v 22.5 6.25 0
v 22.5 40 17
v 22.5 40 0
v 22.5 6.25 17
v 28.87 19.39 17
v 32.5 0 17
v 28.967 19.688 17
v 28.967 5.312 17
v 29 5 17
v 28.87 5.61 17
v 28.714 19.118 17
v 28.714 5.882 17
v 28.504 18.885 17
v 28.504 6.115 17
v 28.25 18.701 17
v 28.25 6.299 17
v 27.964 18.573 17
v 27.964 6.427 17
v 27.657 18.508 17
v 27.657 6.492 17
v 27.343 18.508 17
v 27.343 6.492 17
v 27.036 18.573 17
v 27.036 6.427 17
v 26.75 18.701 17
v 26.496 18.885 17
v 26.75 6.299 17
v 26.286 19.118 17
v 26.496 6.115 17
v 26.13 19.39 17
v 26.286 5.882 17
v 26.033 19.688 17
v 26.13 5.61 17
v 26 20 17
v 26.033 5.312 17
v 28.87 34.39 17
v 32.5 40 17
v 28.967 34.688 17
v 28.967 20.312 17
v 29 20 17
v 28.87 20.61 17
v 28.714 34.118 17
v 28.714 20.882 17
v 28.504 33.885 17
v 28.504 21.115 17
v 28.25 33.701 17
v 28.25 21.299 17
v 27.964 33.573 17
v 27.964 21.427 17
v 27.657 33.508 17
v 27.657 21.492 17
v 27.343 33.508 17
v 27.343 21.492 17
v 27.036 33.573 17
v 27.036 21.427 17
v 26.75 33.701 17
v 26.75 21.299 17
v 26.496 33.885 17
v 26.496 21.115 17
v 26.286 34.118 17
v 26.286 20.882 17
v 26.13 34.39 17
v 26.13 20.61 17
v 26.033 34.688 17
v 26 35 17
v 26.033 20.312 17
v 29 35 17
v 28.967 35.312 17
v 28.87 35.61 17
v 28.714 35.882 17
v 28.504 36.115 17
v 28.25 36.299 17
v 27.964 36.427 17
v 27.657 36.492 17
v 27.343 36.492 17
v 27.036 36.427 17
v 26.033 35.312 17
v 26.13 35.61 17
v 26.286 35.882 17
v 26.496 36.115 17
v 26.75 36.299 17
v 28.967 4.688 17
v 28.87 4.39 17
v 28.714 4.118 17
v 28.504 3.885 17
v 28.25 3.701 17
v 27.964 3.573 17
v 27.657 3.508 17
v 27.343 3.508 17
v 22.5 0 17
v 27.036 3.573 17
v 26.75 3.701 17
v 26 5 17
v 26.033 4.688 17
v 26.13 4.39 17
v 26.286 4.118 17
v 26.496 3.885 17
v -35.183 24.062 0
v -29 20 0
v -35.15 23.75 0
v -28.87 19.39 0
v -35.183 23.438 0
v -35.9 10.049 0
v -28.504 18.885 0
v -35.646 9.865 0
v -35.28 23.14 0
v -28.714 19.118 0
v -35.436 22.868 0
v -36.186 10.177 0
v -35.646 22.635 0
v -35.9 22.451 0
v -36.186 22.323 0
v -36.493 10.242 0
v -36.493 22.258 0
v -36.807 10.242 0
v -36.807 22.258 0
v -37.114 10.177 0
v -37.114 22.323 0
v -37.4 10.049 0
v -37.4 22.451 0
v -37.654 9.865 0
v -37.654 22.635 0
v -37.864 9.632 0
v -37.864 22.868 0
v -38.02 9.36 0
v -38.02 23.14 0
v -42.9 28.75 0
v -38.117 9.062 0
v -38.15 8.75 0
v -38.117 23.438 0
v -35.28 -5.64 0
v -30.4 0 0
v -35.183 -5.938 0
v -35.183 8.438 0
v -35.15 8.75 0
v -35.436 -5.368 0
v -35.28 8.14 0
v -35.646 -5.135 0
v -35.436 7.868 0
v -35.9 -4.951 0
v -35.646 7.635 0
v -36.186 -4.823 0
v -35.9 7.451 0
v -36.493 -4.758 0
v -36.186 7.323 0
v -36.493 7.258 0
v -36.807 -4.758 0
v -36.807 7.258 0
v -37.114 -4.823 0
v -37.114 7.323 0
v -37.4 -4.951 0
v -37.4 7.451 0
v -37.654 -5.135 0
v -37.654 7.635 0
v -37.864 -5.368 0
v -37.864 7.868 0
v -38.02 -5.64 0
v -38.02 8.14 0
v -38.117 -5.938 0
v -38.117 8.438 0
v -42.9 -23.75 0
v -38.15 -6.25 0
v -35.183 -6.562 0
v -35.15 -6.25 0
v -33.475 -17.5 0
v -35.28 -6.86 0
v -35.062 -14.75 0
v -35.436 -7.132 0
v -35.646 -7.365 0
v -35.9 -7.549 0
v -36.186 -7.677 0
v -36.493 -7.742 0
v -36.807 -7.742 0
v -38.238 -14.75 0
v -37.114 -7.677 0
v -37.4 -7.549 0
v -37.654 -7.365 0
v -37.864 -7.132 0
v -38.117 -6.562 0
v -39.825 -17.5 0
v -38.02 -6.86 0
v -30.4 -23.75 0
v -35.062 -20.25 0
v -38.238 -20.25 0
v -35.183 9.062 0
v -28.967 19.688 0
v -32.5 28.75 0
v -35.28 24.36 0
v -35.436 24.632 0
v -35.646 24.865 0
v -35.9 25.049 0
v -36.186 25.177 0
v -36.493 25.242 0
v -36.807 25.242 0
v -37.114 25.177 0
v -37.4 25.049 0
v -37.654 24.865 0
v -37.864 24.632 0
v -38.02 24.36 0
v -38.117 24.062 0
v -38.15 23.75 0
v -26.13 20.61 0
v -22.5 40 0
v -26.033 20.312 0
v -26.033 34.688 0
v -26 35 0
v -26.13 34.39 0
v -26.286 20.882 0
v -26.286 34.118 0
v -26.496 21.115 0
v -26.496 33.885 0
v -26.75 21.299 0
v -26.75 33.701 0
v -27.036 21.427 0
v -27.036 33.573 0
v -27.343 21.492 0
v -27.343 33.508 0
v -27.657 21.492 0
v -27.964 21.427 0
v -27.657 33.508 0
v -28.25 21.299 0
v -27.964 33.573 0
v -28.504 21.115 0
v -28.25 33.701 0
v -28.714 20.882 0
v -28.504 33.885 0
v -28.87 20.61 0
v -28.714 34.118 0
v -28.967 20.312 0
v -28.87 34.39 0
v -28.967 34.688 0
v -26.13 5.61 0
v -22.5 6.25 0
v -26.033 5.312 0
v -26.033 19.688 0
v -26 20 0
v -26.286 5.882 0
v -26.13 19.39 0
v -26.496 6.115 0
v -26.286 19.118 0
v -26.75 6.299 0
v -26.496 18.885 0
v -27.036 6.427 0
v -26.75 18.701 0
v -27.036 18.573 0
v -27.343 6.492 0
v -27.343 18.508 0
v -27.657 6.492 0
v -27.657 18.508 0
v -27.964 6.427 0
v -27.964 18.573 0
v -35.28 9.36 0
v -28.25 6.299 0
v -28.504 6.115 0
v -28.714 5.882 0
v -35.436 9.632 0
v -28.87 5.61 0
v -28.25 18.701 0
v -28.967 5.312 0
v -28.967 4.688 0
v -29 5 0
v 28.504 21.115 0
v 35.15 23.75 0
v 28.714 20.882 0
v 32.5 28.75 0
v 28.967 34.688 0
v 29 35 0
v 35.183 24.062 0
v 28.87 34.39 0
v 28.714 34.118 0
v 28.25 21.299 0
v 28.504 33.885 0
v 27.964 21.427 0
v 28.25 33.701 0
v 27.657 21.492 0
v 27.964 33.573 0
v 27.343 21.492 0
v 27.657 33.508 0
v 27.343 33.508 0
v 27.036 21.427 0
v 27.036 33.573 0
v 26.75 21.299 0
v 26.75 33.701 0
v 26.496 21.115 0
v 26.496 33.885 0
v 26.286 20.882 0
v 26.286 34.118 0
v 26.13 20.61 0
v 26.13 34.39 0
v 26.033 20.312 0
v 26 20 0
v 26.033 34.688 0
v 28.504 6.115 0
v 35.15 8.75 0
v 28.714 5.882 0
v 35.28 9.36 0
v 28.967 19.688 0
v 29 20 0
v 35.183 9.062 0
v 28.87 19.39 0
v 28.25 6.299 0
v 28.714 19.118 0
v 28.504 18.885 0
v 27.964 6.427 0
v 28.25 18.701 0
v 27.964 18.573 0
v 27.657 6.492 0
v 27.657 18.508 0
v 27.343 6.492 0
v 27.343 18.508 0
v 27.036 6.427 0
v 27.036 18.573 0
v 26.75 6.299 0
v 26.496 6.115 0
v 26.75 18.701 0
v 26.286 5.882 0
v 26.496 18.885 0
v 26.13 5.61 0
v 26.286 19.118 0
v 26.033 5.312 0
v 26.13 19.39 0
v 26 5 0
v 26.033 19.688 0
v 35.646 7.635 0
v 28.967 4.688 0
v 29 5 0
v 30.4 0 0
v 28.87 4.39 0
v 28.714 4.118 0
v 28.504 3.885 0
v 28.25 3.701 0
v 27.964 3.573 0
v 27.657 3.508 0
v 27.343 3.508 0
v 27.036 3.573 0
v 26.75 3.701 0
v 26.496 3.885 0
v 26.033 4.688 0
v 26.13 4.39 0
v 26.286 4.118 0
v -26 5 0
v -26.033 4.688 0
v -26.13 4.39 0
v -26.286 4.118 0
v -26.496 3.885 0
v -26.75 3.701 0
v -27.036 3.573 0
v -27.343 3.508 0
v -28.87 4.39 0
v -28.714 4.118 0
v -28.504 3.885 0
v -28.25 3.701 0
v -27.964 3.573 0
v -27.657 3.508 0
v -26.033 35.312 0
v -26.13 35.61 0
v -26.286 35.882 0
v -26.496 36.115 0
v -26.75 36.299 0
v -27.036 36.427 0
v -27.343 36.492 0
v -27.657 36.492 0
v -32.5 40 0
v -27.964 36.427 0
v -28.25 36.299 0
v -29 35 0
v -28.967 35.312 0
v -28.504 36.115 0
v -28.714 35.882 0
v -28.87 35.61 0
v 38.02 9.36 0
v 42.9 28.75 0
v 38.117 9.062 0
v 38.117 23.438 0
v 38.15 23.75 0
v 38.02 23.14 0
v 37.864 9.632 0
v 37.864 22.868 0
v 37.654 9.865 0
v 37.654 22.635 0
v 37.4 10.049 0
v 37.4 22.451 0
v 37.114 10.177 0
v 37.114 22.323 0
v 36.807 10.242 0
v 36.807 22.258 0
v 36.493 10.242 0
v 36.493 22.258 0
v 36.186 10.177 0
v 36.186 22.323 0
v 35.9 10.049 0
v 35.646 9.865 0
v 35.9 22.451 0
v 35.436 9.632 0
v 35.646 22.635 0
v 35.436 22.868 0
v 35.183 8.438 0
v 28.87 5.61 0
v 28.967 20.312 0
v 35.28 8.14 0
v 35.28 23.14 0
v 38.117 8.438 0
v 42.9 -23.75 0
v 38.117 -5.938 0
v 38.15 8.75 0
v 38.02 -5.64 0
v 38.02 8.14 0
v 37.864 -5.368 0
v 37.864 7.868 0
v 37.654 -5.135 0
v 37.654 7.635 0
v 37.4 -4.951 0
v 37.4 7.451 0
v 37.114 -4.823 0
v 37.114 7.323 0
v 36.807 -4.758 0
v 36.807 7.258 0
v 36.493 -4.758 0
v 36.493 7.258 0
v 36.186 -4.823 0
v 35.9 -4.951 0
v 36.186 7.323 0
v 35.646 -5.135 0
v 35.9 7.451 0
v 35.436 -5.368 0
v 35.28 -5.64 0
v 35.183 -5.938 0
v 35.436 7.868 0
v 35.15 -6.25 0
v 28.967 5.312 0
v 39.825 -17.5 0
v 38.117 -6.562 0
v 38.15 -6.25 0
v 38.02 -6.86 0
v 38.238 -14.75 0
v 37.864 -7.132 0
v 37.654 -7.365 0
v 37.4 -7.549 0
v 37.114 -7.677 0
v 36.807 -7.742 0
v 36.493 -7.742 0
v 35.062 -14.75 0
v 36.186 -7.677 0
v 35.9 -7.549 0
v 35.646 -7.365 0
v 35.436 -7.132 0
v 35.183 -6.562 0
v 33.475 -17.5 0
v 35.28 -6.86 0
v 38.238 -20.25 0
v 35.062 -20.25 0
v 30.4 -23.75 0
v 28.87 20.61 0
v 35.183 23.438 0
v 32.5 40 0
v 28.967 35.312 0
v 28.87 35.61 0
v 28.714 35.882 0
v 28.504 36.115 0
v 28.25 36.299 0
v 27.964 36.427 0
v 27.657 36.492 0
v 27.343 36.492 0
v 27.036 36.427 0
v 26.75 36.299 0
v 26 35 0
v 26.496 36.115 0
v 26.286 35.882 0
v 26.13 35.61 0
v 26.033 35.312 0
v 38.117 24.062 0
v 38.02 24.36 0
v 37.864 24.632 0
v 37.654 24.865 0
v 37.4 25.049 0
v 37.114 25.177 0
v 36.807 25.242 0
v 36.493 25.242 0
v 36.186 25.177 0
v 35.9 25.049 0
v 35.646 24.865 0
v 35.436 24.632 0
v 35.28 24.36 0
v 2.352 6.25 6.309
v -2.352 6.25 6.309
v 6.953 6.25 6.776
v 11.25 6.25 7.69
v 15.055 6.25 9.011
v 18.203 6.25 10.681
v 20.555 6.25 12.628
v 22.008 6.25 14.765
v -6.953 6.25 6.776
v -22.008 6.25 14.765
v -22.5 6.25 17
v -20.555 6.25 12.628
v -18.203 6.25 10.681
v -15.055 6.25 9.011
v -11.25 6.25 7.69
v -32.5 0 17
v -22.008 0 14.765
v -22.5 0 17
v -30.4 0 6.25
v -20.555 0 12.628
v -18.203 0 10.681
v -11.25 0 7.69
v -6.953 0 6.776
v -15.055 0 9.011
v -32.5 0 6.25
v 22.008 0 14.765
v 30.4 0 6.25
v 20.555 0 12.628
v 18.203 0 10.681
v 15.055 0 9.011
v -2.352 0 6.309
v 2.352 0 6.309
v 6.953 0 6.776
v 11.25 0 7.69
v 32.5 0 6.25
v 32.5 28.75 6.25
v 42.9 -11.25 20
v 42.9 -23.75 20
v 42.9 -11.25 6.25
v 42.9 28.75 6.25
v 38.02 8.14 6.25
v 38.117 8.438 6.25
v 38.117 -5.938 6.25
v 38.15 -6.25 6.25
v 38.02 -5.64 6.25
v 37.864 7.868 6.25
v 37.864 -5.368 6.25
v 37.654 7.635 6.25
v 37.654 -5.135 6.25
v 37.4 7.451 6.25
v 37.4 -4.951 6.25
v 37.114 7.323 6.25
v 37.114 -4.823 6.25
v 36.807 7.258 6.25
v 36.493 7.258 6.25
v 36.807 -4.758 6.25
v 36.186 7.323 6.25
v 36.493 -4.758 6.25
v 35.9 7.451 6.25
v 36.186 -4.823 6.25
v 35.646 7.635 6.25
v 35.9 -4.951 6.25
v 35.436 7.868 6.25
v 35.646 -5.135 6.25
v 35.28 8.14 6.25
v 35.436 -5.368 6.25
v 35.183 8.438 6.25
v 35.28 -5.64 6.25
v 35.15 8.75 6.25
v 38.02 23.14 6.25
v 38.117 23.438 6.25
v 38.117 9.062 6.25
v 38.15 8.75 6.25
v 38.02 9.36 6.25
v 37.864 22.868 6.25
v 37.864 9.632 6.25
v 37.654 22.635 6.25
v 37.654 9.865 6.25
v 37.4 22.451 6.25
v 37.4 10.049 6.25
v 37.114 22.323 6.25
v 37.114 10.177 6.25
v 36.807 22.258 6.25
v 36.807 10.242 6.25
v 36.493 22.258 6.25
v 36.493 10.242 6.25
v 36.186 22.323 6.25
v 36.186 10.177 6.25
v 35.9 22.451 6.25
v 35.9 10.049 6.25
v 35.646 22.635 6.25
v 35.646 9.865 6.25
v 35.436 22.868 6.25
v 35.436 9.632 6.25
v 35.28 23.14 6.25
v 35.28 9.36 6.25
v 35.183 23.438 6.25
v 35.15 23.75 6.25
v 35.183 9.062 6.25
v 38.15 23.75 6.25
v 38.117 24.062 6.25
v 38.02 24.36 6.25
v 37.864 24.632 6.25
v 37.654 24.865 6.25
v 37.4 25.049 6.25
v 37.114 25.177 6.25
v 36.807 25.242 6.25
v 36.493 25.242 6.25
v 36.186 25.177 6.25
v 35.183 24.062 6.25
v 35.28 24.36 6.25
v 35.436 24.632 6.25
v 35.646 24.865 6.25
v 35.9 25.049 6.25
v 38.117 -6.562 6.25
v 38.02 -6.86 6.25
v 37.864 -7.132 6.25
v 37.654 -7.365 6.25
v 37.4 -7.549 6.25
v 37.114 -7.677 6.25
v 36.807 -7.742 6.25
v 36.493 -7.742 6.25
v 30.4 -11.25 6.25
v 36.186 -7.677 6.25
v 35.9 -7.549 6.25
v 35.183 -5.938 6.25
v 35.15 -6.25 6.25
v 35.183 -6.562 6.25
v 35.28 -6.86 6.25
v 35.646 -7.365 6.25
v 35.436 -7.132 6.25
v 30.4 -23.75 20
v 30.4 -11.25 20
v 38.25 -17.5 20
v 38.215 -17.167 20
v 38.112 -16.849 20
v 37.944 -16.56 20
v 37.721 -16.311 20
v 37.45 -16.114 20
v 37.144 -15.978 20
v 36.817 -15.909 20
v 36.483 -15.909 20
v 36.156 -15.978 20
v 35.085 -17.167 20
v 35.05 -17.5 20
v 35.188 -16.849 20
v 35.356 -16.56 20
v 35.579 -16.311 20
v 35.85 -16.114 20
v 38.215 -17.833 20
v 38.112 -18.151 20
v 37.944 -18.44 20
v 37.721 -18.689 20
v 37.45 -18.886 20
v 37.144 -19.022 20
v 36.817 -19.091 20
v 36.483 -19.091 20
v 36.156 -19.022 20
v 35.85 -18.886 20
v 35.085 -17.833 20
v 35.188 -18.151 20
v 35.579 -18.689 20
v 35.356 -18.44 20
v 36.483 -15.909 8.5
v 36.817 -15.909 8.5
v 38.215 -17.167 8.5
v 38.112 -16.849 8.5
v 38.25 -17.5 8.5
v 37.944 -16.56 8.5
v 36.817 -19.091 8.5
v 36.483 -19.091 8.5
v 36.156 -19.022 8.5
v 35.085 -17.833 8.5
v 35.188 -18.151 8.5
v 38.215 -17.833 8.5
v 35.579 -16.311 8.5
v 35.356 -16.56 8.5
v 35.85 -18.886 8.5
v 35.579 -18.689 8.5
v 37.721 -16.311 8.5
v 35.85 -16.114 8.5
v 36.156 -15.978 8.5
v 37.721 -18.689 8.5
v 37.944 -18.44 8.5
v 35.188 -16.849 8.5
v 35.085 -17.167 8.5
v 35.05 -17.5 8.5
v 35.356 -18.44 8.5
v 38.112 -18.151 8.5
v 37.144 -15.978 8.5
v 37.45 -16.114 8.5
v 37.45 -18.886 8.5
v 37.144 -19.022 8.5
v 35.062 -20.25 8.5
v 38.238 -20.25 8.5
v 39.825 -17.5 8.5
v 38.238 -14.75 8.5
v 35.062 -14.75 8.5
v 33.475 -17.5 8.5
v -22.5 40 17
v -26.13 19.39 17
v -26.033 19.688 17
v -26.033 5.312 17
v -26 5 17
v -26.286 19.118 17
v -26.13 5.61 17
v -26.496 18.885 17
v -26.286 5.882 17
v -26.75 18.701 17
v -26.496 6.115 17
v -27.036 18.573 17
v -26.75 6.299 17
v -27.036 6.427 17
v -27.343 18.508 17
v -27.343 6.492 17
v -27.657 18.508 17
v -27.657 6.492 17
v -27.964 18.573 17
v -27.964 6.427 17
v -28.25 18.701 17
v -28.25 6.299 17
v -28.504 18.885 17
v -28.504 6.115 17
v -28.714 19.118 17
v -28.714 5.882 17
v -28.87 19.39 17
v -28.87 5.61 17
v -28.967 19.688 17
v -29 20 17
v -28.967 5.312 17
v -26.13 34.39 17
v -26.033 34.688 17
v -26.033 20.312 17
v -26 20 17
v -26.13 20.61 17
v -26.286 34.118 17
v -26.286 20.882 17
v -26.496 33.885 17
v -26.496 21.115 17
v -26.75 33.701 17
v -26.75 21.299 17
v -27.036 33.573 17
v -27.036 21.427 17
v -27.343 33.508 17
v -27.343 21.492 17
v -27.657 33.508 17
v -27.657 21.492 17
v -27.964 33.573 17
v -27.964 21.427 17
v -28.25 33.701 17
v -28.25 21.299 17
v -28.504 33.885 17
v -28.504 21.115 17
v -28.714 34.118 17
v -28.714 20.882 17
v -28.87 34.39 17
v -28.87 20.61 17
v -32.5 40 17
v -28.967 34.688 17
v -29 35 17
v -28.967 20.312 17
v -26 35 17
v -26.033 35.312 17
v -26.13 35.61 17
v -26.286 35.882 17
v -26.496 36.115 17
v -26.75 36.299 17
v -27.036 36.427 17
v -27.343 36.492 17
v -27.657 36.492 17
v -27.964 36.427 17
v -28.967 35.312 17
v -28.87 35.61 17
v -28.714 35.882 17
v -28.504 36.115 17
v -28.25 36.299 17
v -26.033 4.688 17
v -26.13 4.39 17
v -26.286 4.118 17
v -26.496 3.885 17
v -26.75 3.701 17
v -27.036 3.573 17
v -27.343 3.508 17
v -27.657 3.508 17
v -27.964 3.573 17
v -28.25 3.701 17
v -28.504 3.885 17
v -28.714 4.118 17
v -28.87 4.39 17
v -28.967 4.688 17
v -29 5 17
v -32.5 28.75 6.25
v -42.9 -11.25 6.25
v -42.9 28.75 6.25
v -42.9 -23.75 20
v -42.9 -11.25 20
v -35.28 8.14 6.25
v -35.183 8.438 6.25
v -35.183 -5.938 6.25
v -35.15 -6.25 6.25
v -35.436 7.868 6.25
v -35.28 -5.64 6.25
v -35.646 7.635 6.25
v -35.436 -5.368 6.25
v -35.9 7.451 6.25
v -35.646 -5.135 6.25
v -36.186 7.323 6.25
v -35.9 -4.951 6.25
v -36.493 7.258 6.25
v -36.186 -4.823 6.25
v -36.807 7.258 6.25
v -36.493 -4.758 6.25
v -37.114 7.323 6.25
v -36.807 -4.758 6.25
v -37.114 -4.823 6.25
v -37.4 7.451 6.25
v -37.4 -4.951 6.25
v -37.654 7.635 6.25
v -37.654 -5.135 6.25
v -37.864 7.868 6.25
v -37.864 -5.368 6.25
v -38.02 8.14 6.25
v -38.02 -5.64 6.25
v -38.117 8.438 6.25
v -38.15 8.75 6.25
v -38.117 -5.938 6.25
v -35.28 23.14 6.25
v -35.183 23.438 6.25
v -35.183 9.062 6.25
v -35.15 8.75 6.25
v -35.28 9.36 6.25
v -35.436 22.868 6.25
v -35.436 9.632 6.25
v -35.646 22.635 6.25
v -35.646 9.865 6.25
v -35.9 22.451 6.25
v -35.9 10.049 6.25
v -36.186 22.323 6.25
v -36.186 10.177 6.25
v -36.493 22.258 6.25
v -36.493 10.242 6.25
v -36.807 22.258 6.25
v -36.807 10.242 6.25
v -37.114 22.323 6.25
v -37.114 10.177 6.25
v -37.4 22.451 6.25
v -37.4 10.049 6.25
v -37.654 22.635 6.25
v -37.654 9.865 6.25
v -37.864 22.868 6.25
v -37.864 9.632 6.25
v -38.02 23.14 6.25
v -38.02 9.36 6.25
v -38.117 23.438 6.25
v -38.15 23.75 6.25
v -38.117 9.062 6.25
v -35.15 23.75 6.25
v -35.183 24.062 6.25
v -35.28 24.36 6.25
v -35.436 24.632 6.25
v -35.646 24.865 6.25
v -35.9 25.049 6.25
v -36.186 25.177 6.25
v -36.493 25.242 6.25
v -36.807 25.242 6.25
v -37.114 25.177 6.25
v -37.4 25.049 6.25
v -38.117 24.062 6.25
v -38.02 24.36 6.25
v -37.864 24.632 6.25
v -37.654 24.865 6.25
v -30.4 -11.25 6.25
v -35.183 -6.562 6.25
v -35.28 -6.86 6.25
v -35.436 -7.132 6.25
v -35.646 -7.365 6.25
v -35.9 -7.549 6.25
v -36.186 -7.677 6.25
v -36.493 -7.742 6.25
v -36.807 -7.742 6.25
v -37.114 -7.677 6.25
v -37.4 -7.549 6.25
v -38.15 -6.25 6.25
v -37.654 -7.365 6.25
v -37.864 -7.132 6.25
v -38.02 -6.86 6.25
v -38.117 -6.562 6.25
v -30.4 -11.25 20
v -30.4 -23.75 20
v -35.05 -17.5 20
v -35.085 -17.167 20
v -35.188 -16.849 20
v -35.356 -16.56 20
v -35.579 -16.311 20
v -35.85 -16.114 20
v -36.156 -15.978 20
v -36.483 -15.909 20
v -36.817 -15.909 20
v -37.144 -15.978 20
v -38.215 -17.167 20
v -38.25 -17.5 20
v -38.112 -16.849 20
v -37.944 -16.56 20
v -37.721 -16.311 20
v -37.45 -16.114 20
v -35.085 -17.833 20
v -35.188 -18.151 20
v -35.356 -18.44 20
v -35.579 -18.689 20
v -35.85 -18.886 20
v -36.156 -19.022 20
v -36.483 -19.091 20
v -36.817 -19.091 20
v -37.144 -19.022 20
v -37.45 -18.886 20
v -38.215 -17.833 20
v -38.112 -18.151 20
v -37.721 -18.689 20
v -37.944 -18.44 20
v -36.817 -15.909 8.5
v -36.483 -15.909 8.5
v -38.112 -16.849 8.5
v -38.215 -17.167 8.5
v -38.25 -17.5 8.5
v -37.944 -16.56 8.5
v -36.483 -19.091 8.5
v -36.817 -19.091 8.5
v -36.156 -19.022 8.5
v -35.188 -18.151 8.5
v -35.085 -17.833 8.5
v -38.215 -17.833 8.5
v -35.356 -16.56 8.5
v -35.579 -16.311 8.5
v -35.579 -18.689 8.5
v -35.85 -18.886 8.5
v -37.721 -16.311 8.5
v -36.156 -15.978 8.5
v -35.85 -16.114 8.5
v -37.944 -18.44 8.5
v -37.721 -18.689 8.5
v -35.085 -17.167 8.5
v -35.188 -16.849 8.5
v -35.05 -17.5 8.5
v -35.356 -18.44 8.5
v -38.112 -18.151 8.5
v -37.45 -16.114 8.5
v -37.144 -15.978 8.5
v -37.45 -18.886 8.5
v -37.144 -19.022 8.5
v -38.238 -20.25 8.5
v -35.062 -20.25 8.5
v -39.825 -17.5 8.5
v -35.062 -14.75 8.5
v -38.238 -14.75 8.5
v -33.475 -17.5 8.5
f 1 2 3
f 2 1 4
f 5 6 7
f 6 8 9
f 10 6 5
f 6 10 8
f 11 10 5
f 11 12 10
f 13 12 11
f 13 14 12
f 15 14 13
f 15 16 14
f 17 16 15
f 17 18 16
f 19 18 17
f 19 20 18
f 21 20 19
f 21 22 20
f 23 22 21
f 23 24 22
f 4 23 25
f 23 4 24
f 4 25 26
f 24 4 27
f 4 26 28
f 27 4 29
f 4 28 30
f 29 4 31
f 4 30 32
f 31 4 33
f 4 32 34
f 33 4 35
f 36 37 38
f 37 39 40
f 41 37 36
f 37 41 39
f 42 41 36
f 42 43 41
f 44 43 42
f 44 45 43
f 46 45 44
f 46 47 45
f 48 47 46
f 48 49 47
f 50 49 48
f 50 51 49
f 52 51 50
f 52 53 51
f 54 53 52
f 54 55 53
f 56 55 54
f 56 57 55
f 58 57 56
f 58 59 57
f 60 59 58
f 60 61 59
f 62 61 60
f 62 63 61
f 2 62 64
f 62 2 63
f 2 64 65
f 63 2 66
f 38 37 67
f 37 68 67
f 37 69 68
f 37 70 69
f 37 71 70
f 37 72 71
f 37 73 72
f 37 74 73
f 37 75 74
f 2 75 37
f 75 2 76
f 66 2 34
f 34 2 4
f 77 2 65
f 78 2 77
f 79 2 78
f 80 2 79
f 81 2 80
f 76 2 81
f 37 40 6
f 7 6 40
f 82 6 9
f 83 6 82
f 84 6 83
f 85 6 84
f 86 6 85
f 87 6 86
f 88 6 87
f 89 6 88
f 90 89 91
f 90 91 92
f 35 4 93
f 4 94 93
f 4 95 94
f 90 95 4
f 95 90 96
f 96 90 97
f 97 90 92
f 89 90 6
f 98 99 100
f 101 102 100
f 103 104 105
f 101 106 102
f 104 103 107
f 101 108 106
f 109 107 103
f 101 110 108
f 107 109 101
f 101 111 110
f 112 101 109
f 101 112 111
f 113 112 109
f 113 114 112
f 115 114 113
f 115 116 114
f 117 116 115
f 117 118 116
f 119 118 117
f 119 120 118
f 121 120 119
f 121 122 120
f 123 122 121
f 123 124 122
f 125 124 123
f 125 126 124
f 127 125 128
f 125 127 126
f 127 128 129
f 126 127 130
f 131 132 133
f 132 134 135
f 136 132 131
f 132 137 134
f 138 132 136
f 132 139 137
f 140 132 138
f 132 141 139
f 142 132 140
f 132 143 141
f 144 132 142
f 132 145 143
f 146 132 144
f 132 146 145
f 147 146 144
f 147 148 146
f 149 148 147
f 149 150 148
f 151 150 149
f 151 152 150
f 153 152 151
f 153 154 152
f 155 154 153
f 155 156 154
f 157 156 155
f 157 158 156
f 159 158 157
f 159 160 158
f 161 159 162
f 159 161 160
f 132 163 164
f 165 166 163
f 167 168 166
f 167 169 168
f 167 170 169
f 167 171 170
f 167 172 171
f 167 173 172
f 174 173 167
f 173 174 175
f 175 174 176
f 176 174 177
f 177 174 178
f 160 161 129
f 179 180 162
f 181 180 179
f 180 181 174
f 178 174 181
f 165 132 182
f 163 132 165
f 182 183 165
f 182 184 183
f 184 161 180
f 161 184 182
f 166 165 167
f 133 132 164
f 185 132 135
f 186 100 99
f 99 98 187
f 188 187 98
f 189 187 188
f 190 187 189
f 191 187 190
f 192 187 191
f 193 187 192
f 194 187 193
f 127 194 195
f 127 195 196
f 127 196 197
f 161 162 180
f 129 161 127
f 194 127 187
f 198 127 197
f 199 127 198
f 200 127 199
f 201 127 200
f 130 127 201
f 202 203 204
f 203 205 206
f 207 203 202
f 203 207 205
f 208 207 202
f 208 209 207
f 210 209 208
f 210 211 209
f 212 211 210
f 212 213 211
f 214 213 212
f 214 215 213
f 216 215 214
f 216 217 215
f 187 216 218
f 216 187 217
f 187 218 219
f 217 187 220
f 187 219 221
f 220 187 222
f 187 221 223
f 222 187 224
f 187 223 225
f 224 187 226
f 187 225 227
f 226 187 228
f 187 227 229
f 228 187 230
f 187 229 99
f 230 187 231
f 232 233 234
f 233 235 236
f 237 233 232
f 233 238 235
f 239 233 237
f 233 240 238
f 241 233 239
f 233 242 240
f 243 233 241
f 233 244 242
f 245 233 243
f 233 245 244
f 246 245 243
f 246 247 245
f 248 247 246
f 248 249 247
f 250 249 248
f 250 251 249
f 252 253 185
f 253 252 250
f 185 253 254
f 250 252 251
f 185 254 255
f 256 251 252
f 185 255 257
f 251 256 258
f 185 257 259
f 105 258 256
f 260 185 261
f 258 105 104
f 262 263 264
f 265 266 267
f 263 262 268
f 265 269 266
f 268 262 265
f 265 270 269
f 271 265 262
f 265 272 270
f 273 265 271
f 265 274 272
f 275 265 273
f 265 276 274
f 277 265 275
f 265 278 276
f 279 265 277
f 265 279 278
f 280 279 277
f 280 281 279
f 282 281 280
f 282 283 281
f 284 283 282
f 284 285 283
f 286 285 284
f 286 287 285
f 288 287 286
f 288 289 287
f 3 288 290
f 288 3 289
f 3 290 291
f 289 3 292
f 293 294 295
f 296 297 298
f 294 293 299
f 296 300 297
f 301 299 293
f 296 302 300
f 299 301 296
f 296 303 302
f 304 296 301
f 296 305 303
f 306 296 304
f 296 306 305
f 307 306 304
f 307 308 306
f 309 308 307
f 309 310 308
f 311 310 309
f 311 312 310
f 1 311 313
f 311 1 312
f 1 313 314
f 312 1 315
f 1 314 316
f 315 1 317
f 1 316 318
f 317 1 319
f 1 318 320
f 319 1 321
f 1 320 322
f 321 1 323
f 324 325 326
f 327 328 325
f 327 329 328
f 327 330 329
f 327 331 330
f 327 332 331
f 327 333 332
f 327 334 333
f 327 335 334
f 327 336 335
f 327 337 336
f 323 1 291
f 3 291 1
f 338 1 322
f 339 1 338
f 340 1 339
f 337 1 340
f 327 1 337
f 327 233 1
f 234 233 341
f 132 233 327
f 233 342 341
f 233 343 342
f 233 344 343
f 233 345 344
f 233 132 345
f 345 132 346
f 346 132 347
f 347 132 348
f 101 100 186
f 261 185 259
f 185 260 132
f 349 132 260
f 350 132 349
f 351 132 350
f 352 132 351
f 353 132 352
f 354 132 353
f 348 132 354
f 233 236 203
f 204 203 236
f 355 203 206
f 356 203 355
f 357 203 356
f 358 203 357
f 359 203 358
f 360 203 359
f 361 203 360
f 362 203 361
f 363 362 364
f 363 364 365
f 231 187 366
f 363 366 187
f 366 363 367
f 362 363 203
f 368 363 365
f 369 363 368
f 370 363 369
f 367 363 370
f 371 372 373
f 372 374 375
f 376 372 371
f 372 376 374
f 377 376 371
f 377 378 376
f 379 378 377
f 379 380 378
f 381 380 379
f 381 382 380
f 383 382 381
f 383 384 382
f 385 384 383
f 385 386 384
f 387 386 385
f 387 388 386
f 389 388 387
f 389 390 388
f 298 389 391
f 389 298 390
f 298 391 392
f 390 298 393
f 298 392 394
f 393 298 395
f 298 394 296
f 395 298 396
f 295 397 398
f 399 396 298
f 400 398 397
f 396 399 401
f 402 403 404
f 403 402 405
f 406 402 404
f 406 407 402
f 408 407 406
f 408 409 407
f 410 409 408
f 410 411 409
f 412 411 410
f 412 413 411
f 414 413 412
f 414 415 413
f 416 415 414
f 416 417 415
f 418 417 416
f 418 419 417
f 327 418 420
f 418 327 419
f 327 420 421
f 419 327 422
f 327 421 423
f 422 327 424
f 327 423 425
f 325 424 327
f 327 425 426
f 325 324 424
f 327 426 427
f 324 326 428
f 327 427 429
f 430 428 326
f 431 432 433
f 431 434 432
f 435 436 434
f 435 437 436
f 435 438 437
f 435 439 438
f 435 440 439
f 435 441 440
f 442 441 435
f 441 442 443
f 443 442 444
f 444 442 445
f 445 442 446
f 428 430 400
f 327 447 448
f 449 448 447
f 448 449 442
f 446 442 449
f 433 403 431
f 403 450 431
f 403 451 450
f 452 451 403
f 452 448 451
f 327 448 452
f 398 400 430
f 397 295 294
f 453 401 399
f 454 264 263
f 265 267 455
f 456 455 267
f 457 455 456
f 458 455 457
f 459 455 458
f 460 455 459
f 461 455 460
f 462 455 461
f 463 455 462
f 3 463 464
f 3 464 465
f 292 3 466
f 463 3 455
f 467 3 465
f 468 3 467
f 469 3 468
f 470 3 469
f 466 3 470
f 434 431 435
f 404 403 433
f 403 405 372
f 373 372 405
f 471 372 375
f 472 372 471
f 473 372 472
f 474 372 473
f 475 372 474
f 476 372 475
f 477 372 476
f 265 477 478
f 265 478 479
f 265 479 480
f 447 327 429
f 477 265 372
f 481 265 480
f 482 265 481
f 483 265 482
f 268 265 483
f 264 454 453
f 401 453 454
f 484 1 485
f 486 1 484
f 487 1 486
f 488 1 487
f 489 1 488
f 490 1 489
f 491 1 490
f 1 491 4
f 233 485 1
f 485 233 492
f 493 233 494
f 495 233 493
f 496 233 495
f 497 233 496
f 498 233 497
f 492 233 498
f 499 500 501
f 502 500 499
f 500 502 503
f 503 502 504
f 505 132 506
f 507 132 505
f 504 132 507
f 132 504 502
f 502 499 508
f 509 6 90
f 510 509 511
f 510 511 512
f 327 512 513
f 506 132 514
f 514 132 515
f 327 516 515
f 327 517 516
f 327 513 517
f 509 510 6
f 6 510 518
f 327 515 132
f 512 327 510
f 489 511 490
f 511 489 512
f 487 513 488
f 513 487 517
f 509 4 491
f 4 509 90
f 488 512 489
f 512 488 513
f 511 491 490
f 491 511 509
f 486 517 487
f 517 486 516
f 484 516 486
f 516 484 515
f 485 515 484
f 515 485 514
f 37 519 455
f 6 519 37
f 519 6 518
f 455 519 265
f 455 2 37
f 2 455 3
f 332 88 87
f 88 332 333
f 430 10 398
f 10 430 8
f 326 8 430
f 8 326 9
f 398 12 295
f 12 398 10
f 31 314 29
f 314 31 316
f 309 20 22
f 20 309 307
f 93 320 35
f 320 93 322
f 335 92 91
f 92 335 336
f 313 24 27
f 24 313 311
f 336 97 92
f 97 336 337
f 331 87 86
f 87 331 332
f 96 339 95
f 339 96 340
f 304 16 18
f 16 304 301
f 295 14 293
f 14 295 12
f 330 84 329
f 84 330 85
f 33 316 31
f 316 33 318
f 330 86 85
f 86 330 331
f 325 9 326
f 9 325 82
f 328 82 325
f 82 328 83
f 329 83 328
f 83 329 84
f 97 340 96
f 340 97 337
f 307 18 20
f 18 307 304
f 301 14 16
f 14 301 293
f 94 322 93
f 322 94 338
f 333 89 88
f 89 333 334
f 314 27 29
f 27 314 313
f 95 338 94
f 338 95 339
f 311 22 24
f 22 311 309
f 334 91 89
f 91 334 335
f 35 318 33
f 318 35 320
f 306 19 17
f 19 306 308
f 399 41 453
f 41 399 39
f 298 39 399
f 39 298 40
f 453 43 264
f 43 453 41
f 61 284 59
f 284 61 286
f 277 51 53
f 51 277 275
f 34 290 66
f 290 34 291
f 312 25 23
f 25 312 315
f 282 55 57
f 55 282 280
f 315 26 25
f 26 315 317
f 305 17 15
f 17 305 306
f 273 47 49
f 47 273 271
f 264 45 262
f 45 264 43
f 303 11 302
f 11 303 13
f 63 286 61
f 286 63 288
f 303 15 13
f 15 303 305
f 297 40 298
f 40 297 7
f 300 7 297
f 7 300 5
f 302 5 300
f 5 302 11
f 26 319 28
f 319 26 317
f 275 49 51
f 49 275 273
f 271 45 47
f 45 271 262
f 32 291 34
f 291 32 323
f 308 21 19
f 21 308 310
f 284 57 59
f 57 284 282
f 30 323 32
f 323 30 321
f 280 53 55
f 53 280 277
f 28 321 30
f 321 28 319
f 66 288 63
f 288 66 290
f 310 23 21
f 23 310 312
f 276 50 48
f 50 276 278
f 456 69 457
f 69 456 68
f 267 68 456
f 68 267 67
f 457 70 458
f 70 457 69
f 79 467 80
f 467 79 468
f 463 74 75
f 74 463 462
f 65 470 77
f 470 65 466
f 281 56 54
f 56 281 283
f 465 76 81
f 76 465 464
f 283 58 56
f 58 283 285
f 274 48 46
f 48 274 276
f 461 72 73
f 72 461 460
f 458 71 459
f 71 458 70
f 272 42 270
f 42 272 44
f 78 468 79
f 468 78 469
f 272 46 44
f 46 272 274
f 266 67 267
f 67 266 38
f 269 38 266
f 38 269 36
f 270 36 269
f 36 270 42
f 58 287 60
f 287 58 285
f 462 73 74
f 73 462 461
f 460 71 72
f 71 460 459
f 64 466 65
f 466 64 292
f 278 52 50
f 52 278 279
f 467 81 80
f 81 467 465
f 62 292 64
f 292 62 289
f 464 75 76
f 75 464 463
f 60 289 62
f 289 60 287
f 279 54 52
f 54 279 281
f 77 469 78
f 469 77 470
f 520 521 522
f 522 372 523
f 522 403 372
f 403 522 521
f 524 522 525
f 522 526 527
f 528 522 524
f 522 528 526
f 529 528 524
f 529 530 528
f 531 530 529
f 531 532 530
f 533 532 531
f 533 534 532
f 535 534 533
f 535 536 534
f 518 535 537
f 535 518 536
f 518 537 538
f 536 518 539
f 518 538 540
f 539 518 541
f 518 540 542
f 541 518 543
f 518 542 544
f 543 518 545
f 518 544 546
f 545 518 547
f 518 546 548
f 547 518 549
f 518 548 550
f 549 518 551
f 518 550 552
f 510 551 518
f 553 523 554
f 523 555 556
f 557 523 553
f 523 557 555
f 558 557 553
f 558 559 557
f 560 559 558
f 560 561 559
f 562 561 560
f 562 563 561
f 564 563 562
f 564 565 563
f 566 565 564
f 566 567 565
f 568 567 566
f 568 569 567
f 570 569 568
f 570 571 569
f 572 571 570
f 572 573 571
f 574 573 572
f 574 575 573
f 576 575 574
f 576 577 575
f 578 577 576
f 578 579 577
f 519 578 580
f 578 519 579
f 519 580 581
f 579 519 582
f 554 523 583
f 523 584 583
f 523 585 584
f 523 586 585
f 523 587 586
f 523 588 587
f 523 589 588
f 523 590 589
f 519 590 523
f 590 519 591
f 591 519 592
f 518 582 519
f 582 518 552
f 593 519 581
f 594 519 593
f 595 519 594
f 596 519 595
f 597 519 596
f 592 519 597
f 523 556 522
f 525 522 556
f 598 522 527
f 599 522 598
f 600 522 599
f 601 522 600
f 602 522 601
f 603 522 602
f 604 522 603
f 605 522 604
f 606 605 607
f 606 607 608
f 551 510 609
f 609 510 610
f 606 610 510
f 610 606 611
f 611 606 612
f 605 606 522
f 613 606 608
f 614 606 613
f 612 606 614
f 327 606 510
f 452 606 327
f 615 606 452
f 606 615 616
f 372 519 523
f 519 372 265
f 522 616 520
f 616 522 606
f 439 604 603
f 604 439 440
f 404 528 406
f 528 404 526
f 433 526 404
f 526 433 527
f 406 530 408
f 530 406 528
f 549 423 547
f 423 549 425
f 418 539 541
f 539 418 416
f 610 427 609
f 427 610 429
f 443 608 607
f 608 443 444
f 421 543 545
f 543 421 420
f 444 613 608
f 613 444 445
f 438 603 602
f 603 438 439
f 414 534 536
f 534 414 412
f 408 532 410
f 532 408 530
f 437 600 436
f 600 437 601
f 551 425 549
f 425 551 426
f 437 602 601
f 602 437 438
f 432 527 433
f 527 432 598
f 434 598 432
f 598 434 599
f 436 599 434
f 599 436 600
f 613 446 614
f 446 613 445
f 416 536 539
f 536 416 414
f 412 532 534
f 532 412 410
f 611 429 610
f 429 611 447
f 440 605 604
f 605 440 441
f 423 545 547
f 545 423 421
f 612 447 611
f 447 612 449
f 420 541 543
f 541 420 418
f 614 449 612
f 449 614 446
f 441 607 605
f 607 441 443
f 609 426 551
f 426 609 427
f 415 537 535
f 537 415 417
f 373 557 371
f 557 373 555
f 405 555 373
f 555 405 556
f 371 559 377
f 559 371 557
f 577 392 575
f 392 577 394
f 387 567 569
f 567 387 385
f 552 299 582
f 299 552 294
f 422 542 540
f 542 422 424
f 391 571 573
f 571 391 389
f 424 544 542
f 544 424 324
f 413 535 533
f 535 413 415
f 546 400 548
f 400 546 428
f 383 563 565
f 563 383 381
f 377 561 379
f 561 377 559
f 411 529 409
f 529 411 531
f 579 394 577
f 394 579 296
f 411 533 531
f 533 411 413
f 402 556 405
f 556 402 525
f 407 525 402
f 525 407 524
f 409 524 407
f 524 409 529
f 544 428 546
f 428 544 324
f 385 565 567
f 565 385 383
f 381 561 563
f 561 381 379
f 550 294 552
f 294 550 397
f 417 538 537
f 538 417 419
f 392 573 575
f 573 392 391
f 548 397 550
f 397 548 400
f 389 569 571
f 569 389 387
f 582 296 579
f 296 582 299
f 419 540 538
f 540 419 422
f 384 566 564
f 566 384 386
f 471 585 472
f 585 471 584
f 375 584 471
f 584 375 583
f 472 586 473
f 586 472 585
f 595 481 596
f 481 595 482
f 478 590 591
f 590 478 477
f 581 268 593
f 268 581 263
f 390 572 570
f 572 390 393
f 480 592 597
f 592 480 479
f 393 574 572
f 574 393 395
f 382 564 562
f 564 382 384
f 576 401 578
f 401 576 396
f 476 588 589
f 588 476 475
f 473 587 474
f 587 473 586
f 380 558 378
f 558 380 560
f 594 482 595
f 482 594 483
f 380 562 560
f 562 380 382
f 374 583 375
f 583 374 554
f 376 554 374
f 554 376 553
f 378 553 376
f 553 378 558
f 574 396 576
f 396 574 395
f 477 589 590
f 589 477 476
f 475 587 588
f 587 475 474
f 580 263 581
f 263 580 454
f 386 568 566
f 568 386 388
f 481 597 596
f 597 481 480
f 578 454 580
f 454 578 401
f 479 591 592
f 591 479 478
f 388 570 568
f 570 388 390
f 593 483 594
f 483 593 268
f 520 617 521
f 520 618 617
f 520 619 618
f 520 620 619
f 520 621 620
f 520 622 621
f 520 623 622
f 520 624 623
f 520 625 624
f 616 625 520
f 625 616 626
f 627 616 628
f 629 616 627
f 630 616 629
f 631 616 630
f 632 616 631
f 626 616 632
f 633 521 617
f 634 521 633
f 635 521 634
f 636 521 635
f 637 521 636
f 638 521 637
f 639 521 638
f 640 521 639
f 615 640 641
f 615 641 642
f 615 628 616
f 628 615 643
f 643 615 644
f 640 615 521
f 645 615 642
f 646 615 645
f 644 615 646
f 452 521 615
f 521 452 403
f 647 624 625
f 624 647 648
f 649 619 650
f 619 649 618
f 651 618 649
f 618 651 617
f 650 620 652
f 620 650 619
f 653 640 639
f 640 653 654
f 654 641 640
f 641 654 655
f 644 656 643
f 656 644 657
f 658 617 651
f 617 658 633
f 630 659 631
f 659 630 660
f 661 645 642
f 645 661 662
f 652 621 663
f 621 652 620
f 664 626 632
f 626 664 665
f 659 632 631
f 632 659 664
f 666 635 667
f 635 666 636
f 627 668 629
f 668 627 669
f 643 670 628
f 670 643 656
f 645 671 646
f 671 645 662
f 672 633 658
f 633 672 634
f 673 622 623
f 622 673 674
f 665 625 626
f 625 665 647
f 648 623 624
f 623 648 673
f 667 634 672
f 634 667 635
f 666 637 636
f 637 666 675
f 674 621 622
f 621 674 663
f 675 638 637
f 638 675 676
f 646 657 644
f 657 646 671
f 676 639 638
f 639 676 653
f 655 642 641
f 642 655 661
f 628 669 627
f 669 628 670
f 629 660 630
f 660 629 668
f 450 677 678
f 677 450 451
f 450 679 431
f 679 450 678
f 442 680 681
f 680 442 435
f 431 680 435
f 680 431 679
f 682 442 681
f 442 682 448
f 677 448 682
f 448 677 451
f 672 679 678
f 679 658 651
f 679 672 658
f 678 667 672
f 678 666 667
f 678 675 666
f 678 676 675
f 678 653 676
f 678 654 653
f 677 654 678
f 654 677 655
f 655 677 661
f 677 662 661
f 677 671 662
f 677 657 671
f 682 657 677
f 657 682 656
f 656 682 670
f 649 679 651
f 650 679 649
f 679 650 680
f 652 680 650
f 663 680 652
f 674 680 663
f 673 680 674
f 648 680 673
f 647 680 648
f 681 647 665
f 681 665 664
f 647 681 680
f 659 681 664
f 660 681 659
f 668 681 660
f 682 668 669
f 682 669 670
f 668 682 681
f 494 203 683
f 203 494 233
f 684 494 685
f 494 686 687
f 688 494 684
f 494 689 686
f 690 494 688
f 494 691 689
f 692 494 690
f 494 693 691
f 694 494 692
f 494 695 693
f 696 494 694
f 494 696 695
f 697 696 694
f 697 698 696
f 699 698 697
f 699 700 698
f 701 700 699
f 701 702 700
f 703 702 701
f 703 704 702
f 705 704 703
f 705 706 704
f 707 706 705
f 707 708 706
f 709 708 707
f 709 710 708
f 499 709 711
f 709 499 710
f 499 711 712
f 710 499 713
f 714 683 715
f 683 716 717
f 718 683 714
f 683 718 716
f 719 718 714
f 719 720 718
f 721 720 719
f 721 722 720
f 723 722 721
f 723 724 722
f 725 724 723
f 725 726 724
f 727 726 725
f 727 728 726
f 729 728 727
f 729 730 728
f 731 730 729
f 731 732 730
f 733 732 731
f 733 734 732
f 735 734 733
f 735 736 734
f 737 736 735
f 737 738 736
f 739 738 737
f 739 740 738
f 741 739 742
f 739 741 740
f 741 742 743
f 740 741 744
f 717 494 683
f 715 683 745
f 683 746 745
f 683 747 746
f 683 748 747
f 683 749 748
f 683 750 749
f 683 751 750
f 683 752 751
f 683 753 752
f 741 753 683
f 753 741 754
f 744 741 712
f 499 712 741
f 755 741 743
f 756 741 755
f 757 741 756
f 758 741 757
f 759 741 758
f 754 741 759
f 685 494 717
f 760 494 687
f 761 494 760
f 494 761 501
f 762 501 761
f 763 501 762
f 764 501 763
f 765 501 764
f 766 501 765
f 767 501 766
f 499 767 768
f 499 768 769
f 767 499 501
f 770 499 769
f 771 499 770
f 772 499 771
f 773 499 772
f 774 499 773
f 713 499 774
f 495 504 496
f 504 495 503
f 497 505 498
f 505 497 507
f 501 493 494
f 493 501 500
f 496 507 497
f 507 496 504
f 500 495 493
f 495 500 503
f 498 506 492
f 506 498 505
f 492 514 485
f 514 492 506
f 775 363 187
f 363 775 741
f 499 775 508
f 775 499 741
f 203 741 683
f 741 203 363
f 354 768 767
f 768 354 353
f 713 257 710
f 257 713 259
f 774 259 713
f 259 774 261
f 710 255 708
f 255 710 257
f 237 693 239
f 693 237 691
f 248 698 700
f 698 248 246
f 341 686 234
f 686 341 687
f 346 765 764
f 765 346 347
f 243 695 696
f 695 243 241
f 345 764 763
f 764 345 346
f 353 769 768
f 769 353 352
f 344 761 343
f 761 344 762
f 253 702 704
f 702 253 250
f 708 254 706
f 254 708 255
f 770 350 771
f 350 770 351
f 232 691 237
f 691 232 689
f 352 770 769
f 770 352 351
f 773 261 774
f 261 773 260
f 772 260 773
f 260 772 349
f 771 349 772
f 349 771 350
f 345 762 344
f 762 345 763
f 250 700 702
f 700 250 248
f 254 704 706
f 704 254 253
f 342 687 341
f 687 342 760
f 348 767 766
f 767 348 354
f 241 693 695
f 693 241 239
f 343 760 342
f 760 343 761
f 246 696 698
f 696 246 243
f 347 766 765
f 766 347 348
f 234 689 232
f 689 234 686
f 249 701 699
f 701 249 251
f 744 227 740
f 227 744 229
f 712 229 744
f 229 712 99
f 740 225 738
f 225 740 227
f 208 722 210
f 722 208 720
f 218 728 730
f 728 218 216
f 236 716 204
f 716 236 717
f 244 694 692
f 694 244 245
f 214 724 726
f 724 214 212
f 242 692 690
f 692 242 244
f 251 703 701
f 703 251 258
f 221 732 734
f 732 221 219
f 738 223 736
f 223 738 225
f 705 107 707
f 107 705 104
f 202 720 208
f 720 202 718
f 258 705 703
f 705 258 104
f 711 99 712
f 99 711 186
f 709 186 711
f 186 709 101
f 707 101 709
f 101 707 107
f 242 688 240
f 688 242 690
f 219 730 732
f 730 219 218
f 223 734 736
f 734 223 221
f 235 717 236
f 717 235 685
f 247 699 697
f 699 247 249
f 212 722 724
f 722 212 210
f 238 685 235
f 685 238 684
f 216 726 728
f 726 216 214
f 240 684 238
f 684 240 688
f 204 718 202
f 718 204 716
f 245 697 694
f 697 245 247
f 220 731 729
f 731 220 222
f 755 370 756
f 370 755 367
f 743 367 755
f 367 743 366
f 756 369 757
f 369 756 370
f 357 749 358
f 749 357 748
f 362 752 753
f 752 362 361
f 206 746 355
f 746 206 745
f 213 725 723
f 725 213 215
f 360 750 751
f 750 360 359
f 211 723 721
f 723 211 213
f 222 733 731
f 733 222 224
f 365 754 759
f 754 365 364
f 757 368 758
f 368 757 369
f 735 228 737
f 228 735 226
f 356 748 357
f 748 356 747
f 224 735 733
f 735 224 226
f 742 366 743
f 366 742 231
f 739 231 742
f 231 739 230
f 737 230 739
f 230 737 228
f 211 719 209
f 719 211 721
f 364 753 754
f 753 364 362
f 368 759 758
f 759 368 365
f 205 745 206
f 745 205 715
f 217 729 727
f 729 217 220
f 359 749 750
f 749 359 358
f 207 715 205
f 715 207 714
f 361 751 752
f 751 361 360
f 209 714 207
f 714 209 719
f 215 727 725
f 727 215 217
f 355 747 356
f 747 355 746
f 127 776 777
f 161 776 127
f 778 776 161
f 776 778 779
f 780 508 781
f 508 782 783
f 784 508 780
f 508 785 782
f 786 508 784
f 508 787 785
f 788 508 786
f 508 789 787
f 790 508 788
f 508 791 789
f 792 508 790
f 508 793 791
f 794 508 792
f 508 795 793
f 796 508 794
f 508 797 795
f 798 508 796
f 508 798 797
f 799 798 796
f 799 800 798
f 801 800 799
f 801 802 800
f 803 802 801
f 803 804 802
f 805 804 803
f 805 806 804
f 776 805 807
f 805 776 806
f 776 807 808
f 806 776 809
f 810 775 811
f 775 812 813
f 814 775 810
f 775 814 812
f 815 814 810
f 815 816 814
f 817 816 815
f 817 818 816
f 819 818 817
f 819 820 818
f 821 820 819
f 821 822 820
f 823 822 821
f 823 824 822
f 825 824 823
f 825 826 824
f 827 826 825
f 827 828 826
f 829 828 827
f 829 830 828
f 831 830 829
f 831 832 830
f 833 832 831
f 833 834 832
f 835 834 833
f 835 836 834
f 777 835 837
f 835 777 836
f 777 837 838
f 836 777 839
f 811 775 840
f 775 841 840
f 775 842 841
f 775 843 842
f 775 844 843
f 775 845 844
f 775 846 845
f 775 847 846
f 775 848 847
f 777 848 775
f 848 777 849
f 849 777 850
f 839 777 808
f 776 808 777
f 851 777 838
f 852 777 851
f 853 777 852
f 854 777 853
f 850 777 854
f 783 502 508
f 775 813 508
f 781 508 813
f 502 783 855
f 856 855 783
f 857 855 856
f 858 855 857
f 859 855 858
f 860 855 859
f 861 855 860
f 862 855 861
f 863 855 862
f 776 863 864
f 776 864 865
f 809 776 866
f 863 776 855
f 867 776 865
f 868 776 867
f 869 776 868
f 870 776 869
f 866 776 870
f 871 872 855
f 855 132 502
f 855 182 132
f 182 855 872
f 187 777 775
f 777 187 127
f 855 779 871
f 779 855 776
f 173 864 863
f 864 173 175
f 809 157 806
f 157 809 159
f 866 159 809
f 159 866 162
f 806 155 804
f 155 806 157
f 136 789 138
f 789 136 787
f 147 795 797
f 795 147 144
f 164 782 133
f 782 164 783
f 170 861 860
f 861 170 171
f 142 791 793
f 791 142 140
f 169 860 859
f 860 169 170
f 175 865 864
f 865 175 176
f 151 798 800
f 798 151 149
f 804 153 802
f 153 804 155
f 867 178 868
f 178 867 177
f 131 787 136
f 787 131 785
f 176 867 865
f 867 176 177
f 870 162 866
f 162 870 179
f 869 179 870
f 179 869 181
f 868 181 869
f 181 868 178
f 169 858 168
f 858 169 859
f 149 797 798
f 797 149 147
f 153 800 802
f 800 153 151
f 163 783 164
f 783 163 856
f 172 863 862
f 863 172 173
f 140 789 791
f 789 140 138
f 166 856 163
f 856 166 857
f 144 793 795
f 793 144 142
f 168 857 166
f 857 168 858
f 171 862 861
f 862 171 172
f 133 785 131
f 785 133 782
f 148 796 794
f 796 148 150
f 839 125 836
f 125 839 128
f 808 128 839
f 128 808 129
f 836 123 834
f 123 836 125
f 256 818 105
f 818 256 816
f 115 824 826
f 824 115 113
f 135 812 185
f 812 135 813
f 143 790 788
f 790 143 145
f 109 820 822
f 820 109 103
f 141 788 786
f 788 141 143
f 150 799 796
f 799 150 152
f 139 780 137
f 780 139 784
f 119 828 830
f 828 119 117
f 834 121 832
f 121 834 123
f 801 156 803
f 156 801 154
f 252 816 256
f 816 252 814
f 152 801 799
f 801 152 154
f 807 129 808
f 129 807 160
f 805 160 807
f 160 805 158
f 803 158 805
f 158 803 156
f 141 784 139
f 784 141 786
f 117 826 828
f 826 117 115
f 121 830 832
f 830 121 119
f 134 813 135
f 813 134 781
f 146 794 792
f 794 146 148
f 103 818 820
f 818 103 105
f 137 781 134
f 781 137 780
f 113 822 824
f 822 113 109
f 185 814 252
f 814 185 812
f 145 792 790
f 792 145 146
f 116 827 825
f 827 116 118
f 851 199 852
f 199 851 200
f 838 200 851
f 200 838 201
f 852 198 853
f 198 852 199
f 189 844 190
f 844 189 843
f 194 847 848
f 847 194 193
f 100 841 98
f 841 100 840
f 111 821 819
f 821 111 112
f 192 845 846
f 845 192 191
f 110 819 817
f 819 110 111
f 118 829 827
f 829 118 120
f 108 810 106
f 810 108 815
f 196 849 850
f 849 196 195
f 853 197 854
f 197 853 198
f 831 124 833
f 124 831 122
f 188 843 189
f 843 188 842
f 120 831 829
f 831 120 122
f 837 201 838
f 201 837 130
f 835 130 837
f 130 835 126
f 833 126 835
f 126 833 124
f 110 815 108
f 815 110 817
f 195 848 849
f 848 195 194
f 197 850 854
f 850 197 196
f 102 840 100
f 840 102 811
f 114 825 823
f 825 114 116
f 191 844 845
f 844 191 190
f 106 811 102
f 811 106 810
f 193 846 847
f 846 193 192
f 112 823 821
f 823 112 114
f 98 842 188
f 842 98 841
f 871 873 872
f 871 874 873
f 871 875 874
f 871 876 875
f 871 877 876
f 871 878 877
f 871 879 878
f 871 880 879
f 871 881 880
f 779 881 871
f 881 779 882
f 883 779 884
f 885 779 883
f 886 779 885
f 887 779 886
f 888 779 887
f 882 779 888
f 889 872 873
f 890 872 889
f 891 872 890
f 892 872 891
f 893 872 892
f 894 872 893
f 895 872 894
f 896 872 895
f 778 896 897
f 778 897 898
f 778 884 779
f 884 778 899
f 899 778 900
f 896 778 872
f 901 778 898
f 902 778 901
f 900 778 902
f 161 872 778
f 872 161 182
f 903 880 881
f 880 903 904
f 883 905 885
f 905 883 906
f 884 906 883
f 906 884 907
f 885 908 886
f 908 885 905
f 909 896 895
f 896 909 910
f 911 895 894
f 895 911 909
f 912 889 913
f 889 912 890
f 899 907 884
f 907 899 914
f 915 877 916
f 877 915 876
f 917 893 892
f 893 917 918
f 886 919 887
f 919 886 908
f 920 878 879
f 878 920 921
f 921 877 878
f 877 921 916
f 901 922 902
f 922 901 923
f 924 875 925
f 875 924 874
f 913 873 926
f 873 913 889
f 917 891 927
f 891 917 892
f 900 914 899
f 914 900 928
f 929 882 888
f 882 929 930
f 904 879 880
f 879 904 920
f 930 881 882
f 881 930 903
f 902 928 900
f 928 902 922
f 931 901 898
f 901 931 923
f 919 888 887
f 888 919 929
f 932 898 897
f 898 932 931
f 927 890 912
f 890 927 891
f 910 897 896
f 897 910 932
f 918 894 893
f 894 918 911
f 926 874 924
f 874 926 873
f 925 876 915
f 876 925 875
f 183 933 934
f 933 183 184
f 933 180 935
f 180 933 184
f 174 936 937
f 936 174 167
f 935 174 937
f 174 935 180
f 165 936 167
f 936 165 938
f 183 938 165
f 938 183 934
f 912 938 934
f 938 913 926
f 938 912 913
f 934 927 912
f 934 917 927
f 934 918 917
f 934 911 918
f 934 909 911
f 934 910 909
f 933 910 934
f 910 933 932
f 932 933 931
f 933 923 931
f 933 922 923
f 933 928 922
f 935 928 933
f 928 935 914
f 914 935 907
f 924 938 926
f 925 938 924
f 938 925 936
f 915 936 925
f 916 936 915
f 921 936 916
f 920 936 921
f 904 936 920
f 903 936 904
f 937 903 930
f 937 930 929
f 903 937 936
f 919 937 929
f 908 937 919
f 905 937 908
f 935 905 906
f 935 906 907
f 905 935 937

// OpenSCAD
//OpenSCAD version 2021.01
//Bracket for mounting a single BMG extruder to Makerbot Dual Extruder carriage
//Simon Pilepich 2021-09-16

//Works nema bracket that comes with BMG kit

h=17; //Height to raise the bracket by
mount_hole_spacing=73.3;
mount_hole_diameter=3;
mount_hole_nut=5.5;
w=12.5; // width of attachment square
carriage_width = 130; // Overall carrier width
mount_hole_nut_radius=mount_hole_nut/2/sin(30)/sin(60); //Calculate diameter for nut
y_offset = 21.5-4; // Back spacing




one_side();
mirror([1,0,0]) one_side();

module one_side() {
    //NEMA bracket riser
    nbr=[carriage_width/2,40,h];
    difference() {
        //NEMA base block
        cube([nbr[0]/2,nbr[1],nbr[2]]);
        translate([0,w/2,0]) {
            //space saving hole
            cube([nbr[0]/2-10,nbr[1],nbr[2]]);
            //arch
            scale([((nbr[0]/2)-10)/(h-w/2),1,1]) translate([0,0,h]) rotate([90,0,0]) cylinder(r=h-w/2,h=w/2);
        }
        //NEMA bracker mount screw 
        translate([nbr[0]/2-5,5,0]) cylinder(d=3,h=h,$fn=30);
        translate([nbr[0]/2-5,nbr[1]/2,0]) cylinder(d=3,h=h,$fn=30);
        translate([nbr[0]/2-5,nbr[1]-5,0]) cylinder(d=3,h=h,$fn=30);

    }
    //Connecting brace
    translate([mount_hole_spacing/2-w/2,+w/2-y_offset,0]) {
        difference() {
            cube([w,nbr[1],w/2]);
            //Connecting brace holes
            translate([+w/2,5,0]) cylinder(d=3,h=h,$fn=30);
            translate([+w/2,nbr[1]/2,0]) cylinder(d=3,h=h,$fn=30);
            translate([+w/2,nbr[1]-5,0]) cylinder(d=3,h=h,$fn=30);
        }
    }
    //mount post
    translate([mount_hole_spacing/2-w/2,-w/2-y_offset,]) {
        difference() {
            cube([w,w,h+3]);
            //Through hole
            translate([w/2,w/2,0]) cylinder(d=3.2,h=h+3,$fn=30);
            // Nut hex (d=6.25 for 5.5mm nut)
            translate([w/2,w/2,0]) cylinder(d=mount_hole_nut_radius,h=h/2,$fn=6);
        }
    }
}
